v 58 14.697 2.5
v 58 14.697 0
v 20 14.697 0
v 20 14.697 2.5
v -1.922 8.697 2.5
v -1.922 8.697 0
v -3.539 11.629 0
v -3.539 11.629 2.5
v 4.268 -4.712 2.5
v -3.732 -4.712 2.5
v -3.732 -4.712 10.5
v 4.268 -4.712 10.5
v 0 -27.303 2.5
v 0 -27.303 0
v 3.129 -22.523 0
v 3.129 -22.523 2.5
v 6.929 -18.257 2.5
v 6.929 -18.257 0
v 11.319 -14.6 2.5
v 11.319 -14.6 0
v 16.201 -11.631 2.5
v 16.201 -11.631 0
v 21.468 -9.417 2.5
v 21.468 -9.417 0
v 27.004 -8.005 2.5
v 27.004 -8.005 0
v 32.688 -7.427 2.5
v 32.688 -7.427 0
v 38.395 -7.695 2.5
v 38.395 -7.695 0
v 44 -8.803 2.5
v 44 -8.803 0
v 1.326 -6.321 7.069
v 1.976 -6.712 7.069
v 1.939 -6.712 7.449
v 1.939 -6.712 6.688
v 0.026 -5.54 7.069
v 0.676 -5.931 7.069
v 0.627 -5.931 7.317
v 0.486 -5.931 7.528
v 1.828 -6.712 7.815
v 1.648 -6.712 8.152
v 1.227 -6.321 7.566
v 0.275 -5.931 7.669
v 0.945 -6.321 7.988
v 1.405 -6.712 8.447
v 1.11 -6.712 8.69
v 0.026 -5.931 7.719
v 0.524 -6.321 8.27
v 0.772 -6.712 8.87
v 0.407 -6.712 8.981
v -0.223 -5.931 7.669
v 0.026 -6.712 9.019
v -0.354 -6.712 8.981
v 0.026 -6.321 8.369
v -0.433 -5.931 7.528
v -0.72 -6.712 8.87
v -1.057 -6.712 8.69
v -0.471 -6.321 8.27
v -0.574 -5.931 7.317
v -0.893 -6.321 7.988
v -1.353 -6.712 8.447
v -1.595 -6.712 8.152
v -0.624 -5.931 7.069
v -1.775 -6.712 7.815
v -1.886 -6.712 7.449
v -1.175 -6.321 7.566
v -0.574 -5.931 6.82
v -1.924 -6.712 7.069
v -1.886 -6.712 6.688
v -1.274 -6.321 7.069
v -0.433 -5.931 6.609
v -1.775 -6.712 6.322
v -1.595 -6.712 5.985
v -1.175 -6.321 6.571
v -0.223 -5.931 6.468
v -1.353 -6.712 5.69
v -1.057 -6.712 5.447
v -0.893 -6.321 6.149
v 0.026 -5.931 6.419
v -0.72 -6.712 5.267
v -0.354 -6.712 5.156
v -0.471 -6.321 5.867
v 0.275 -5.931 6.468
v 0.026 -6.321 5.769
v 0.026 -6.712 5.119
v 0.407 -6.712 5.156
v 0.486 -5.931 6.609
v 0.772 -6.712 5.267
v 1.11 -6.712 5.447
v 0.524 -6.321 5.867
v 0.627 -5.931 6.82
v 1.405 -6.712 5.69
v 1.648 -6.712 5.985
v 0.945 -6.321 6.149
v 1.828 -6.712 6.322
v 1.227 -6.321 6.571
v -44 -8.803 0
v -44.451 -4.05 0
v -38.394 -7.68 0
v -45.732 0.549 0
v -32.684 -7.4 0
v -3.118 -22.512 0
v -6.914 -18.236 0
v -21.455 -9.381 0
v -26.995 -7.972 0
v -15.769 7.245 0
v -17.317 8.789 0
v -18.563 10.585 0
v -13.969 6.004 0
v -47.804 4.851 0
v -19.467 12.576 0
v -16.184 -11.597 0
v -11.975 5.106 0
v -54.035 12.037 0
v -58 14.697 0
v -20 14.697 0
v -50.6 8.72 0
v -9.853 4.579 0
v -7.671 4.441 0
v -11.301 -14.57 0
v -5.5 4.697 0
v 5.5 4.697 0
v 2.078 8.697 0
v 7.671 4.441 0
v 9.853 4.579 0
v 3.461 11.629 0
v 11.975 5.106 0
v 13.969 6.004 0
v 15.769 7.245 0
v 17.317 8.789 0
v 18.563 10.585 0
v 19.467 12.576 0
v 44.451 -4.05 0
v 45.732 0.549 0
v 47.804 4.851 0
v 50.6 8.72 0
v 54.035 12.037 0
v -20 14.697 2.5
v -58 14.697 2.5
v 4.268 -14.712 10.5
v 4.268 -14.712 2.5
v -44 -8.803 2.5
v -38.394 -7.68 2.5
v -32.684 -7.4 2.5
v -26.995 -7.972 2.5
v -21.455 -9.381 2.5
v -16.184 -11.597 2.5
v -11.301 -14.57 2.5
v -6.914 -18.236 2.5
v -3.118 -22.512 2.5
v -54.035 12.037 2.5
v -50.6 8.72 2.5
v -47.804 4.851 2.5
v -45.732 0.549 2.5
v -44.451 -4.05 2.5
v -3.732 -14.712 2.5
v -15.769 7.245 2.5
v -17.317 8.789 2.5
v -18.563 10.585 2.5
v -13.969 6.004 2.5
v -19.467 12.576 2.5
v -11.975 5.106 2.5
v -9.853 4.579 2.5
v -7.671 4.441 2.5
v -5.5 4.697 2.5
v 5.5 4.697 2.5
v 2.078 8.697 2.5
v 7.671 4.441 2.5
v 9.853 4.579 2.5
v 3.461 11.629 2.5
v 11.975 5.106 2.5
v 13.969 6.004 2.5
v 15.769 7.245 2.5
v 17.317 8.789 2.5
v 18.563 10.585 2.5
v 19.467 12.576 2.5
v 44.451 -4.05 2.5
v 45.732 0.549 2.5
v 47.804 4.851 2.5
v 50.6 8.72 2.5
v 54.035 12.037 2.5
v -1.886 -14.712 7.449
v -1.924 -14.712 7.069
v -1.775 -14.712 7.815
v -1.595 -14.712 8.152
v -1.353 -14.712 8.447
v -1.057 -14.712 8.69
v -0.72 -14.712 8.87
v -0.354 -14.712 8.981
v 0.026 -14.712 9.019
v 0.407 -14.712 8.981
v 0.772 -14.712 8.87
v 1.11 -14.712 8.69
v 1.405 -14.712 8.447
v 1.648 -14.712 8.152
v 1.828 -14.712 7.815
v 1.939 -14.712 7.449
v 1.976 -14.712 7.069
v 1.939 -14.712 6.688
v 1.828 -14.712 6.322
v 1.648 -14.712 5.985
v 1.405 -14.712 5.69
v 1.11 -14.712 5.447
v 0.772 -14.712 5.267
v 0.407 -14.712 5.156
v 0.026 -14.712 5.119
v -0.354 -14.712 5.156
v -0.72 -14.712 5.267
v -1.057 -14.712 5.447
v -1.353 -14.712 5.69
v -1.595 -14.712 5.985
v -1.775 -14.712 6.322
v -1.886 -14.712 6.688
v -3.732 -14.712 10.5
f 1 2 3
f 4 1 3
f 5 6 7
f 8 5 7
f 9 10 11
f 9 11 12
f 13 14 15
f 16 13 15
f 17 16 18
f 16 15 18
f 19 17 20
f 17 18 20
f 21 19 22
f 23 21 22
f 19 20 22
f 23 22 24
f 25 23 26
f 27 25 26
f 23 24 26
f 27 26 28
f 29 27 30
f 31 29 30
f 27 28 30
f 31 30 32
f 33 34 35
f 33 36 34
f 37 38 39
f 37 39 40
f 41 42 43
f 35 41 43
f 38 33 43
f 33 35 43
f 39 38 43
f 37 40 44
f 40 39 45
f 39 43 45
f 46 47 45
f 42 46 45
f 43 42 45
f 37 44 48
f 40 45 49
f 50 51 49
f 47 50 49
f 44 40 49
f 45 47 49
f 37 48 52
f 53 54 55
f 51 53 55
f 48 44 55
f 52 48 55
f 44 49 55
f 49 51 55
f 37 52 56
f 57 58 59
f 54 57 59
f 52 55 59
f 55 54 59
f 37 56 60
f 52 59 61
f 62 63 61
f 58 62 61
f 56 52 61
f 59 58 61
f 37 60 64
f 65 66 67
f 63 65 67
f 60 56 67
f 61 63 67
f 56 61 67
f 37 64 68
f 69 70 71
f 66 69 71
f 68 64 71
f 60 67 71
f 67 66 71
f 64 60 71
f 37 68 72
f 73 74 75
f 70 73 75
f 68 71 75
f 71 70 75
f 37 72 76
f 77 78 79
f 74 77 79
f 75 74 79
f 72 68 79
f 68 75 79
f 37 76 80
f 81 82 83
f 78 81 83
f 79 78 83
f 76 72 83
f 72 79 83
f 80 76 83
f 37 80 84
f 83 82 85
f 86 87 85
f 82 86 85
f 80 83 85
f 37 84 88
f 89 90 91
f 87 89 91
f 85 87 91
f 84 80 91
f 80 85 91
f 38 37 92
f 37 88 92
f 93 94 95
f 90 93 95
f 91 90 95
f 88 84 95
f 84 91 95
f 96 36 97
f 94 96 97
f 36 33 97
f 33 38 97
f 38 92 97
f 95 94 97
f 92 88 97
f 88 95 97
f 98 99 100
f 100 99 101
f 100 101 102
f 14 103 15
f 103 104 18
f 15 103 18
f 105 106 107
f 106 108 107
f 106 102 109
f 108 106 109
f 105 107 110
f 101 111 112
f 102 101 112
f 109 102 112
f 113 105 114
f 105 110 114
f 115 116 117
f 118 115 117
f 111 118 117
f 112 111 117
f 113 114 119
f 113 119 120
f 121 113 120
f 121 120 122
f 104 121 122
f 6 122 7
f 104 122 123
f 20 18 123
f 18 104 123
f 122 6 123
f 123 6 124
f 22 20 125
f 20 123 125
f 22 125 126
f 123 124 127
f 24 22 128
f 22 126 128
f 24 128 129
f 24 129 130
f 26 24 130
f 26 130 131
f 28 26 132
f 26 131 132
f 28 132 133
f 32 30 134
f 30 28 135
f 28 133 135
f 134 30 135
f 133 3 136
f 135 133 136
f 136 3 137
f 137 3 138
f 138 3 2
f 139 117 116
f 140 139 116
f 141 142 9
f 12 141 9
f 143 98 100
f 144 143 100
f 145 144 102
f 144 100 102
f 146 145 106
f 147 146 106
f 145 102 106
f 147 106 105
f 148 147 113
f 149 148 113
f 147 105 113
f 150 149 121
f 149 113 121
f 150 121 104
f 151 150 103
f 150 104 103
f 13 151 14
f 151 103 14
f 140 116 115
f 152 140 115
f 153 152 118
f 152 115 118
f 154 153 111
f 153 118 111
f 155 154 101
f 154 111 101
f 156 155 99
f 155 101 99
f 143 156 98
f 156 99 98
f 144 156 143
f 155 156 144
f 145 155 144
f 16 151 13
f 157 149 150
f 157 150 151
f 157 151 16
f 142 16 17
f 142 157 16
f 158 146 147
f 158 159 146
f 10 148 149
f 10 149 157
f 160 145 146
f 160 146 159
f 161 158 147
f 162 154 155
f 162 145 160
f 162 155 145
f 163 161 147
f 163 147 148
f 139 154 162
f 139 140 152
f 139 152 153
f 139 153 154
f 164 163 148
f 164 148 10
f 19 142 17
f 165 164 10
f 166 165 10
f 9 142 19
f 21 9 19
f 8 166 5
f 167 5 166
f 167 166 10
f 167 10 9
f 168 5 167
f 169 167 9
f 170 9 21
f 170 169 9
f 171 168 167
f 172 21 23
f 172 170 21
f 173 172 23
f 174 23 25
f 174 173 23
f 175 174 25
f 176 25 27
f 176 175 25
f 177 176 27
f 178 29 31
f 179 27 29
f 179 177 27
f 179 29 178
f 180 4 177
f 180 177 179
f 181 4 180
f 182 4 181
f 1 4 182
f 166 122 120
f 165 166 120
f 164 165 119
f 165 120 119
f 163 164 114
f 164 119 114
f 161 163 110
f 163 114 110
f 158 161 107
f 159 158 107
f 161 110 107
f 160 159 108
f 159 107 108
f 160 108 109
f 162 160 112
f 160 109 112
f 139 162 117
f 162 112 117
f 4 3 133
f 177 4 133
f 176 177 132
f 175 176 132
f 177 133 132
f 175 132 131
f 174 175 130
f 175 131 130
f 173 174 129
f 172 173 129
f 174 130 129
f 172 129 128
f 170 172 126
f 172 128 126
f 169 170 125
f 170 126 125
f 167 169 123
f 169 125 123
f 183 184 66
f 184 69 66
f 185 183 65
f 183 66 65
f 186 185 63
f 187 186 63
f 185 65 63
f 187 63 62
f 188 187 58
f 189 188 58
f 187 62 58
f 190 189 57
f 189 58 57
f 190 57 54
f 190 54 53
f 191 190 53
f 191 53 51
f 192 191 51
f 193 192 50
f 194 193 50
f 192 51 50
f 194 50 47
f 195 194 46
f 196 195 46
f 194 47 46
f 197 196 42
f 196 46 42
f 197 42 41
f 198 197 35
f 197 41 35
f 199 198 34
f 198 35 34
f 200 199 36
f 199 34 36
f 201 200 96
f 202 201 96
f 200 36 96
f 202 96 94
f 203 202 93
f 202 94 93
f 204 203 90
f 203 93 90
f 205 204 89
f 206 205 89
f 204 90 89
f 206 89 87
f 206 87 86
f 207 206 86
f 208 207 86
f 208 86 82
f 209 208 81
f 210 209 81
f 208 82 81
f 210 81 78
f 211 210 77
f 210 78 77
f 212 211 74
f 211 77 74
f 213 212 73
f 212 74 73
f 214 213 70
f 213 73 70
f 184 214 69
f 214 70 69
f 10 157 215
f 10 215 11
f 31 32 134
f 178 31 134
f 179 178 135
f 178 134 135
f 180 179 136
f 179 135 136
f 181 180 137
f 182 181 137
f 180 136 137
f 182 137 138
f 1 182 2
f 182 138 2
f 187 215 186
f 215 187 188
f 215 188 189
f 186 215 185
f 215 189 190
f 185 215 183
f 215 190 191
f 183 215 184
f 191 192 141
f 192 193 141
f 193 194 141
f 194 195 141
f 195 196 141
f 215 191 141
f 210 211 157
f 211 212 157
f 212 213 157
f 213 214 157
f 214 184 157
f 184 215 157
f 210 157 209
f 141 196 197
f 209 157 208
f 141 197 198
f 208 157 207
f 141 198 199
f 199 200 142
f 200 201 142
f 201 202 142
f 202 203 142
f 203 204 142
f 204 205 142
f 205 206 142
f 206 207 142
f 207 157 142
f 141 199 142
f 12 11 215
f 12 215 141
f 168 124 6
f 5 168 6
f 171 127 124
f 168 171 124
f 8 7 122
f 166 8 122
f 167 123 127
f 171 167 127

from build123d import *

# Parameters (mm, degrees)
F1_DEPTH = 2.5
F2_W     = 8
F2_H     = 10
F3_DEPTH = 8
F5_D     = 3.9
F5_DEPTH = 8
F5_TIP   = 1.1716782071


with BuildPart() as f1:
    # F0 (on Top) → F1 (new body)
    with BuildSketch(Plane.XY):
        with BuildLine():
            Line((-20.0000001545, 14.6966284215), (-58.0000001545, 14.6966284215))
            ThreePointArc((-58.0000001545, 14.6966284215), (-47.8037567712, 4.8507734158), (-44.0000001545, -8.8033715785))
            ThreePointArc((-44.0000001545, -8.8033715785), (-18.7781642386, -10.3906266976), (-1.545e-07, -27.3033715785))
            ThreePointArc((-1.545e-07, -27.3033715785), (18.7930768405, -10.4260952422), (43.9999998455, -8.8033715785))
            ThreePointArc((43.9999998455, -8.8033715785), (47.8037564623, 4.8507734158), (57.9999998455, 14.6966284215))
            Line((57.9999998455, 14.6966284215), (19.9999998455, 14.6966284215))
            ThreePointArc((19.9999998455, 14.6966284215), (14.8965569576, 6.584120609), (5.4999998455, 4.6966284215))
            Line((5.4999998455, 4.6966284215), (3.4606747963, 11.629213579))
            Line((3.4606747963, 11.629213579), (2.0776513566, 8.6966284215))
            Line((2.0776513566, 8.6966284215), (-1.9223486434, 8.6966284215))
            Line((-1.9223486434, 8.6966284215), (-3.5393252037, 11.629213579))
            Line((-3.5393252037, 11.629213579), (-5.5000001545, 4.6966284215))
            ThreePointArc((-5.5000001545, 4.6966284215), (-14.8965572665, 6.584120609), (-20.0000001545, 14.6966284215))
        make_face()
    extrude(amount=F1_DEPTH)

    # F2 (on face) → F3 (join)
    with BuildSketch(Plane.XY.offset(2.5)):
        with Locations((0.2678574529, -9.7117358875)):
            Rectangle(F2_W, F2_H)
    extrude(amount=F3_DEPTH)

    # F5
    with Locations(Plane.XZ.offset(14.7117358875)):
        with Locations((0.0262330668, 7.0685278624)):
            Hole(F5_D / 2, depth=F5_DEPTH)
            with Locations((0, 0, -(F5_DEPTH + F5_TIP / 2))):  # 118° drill point
                Cone(0, F5_D / 2, F5_TIP, mode=Mode.SUBTRACT)


solid = f1.part
